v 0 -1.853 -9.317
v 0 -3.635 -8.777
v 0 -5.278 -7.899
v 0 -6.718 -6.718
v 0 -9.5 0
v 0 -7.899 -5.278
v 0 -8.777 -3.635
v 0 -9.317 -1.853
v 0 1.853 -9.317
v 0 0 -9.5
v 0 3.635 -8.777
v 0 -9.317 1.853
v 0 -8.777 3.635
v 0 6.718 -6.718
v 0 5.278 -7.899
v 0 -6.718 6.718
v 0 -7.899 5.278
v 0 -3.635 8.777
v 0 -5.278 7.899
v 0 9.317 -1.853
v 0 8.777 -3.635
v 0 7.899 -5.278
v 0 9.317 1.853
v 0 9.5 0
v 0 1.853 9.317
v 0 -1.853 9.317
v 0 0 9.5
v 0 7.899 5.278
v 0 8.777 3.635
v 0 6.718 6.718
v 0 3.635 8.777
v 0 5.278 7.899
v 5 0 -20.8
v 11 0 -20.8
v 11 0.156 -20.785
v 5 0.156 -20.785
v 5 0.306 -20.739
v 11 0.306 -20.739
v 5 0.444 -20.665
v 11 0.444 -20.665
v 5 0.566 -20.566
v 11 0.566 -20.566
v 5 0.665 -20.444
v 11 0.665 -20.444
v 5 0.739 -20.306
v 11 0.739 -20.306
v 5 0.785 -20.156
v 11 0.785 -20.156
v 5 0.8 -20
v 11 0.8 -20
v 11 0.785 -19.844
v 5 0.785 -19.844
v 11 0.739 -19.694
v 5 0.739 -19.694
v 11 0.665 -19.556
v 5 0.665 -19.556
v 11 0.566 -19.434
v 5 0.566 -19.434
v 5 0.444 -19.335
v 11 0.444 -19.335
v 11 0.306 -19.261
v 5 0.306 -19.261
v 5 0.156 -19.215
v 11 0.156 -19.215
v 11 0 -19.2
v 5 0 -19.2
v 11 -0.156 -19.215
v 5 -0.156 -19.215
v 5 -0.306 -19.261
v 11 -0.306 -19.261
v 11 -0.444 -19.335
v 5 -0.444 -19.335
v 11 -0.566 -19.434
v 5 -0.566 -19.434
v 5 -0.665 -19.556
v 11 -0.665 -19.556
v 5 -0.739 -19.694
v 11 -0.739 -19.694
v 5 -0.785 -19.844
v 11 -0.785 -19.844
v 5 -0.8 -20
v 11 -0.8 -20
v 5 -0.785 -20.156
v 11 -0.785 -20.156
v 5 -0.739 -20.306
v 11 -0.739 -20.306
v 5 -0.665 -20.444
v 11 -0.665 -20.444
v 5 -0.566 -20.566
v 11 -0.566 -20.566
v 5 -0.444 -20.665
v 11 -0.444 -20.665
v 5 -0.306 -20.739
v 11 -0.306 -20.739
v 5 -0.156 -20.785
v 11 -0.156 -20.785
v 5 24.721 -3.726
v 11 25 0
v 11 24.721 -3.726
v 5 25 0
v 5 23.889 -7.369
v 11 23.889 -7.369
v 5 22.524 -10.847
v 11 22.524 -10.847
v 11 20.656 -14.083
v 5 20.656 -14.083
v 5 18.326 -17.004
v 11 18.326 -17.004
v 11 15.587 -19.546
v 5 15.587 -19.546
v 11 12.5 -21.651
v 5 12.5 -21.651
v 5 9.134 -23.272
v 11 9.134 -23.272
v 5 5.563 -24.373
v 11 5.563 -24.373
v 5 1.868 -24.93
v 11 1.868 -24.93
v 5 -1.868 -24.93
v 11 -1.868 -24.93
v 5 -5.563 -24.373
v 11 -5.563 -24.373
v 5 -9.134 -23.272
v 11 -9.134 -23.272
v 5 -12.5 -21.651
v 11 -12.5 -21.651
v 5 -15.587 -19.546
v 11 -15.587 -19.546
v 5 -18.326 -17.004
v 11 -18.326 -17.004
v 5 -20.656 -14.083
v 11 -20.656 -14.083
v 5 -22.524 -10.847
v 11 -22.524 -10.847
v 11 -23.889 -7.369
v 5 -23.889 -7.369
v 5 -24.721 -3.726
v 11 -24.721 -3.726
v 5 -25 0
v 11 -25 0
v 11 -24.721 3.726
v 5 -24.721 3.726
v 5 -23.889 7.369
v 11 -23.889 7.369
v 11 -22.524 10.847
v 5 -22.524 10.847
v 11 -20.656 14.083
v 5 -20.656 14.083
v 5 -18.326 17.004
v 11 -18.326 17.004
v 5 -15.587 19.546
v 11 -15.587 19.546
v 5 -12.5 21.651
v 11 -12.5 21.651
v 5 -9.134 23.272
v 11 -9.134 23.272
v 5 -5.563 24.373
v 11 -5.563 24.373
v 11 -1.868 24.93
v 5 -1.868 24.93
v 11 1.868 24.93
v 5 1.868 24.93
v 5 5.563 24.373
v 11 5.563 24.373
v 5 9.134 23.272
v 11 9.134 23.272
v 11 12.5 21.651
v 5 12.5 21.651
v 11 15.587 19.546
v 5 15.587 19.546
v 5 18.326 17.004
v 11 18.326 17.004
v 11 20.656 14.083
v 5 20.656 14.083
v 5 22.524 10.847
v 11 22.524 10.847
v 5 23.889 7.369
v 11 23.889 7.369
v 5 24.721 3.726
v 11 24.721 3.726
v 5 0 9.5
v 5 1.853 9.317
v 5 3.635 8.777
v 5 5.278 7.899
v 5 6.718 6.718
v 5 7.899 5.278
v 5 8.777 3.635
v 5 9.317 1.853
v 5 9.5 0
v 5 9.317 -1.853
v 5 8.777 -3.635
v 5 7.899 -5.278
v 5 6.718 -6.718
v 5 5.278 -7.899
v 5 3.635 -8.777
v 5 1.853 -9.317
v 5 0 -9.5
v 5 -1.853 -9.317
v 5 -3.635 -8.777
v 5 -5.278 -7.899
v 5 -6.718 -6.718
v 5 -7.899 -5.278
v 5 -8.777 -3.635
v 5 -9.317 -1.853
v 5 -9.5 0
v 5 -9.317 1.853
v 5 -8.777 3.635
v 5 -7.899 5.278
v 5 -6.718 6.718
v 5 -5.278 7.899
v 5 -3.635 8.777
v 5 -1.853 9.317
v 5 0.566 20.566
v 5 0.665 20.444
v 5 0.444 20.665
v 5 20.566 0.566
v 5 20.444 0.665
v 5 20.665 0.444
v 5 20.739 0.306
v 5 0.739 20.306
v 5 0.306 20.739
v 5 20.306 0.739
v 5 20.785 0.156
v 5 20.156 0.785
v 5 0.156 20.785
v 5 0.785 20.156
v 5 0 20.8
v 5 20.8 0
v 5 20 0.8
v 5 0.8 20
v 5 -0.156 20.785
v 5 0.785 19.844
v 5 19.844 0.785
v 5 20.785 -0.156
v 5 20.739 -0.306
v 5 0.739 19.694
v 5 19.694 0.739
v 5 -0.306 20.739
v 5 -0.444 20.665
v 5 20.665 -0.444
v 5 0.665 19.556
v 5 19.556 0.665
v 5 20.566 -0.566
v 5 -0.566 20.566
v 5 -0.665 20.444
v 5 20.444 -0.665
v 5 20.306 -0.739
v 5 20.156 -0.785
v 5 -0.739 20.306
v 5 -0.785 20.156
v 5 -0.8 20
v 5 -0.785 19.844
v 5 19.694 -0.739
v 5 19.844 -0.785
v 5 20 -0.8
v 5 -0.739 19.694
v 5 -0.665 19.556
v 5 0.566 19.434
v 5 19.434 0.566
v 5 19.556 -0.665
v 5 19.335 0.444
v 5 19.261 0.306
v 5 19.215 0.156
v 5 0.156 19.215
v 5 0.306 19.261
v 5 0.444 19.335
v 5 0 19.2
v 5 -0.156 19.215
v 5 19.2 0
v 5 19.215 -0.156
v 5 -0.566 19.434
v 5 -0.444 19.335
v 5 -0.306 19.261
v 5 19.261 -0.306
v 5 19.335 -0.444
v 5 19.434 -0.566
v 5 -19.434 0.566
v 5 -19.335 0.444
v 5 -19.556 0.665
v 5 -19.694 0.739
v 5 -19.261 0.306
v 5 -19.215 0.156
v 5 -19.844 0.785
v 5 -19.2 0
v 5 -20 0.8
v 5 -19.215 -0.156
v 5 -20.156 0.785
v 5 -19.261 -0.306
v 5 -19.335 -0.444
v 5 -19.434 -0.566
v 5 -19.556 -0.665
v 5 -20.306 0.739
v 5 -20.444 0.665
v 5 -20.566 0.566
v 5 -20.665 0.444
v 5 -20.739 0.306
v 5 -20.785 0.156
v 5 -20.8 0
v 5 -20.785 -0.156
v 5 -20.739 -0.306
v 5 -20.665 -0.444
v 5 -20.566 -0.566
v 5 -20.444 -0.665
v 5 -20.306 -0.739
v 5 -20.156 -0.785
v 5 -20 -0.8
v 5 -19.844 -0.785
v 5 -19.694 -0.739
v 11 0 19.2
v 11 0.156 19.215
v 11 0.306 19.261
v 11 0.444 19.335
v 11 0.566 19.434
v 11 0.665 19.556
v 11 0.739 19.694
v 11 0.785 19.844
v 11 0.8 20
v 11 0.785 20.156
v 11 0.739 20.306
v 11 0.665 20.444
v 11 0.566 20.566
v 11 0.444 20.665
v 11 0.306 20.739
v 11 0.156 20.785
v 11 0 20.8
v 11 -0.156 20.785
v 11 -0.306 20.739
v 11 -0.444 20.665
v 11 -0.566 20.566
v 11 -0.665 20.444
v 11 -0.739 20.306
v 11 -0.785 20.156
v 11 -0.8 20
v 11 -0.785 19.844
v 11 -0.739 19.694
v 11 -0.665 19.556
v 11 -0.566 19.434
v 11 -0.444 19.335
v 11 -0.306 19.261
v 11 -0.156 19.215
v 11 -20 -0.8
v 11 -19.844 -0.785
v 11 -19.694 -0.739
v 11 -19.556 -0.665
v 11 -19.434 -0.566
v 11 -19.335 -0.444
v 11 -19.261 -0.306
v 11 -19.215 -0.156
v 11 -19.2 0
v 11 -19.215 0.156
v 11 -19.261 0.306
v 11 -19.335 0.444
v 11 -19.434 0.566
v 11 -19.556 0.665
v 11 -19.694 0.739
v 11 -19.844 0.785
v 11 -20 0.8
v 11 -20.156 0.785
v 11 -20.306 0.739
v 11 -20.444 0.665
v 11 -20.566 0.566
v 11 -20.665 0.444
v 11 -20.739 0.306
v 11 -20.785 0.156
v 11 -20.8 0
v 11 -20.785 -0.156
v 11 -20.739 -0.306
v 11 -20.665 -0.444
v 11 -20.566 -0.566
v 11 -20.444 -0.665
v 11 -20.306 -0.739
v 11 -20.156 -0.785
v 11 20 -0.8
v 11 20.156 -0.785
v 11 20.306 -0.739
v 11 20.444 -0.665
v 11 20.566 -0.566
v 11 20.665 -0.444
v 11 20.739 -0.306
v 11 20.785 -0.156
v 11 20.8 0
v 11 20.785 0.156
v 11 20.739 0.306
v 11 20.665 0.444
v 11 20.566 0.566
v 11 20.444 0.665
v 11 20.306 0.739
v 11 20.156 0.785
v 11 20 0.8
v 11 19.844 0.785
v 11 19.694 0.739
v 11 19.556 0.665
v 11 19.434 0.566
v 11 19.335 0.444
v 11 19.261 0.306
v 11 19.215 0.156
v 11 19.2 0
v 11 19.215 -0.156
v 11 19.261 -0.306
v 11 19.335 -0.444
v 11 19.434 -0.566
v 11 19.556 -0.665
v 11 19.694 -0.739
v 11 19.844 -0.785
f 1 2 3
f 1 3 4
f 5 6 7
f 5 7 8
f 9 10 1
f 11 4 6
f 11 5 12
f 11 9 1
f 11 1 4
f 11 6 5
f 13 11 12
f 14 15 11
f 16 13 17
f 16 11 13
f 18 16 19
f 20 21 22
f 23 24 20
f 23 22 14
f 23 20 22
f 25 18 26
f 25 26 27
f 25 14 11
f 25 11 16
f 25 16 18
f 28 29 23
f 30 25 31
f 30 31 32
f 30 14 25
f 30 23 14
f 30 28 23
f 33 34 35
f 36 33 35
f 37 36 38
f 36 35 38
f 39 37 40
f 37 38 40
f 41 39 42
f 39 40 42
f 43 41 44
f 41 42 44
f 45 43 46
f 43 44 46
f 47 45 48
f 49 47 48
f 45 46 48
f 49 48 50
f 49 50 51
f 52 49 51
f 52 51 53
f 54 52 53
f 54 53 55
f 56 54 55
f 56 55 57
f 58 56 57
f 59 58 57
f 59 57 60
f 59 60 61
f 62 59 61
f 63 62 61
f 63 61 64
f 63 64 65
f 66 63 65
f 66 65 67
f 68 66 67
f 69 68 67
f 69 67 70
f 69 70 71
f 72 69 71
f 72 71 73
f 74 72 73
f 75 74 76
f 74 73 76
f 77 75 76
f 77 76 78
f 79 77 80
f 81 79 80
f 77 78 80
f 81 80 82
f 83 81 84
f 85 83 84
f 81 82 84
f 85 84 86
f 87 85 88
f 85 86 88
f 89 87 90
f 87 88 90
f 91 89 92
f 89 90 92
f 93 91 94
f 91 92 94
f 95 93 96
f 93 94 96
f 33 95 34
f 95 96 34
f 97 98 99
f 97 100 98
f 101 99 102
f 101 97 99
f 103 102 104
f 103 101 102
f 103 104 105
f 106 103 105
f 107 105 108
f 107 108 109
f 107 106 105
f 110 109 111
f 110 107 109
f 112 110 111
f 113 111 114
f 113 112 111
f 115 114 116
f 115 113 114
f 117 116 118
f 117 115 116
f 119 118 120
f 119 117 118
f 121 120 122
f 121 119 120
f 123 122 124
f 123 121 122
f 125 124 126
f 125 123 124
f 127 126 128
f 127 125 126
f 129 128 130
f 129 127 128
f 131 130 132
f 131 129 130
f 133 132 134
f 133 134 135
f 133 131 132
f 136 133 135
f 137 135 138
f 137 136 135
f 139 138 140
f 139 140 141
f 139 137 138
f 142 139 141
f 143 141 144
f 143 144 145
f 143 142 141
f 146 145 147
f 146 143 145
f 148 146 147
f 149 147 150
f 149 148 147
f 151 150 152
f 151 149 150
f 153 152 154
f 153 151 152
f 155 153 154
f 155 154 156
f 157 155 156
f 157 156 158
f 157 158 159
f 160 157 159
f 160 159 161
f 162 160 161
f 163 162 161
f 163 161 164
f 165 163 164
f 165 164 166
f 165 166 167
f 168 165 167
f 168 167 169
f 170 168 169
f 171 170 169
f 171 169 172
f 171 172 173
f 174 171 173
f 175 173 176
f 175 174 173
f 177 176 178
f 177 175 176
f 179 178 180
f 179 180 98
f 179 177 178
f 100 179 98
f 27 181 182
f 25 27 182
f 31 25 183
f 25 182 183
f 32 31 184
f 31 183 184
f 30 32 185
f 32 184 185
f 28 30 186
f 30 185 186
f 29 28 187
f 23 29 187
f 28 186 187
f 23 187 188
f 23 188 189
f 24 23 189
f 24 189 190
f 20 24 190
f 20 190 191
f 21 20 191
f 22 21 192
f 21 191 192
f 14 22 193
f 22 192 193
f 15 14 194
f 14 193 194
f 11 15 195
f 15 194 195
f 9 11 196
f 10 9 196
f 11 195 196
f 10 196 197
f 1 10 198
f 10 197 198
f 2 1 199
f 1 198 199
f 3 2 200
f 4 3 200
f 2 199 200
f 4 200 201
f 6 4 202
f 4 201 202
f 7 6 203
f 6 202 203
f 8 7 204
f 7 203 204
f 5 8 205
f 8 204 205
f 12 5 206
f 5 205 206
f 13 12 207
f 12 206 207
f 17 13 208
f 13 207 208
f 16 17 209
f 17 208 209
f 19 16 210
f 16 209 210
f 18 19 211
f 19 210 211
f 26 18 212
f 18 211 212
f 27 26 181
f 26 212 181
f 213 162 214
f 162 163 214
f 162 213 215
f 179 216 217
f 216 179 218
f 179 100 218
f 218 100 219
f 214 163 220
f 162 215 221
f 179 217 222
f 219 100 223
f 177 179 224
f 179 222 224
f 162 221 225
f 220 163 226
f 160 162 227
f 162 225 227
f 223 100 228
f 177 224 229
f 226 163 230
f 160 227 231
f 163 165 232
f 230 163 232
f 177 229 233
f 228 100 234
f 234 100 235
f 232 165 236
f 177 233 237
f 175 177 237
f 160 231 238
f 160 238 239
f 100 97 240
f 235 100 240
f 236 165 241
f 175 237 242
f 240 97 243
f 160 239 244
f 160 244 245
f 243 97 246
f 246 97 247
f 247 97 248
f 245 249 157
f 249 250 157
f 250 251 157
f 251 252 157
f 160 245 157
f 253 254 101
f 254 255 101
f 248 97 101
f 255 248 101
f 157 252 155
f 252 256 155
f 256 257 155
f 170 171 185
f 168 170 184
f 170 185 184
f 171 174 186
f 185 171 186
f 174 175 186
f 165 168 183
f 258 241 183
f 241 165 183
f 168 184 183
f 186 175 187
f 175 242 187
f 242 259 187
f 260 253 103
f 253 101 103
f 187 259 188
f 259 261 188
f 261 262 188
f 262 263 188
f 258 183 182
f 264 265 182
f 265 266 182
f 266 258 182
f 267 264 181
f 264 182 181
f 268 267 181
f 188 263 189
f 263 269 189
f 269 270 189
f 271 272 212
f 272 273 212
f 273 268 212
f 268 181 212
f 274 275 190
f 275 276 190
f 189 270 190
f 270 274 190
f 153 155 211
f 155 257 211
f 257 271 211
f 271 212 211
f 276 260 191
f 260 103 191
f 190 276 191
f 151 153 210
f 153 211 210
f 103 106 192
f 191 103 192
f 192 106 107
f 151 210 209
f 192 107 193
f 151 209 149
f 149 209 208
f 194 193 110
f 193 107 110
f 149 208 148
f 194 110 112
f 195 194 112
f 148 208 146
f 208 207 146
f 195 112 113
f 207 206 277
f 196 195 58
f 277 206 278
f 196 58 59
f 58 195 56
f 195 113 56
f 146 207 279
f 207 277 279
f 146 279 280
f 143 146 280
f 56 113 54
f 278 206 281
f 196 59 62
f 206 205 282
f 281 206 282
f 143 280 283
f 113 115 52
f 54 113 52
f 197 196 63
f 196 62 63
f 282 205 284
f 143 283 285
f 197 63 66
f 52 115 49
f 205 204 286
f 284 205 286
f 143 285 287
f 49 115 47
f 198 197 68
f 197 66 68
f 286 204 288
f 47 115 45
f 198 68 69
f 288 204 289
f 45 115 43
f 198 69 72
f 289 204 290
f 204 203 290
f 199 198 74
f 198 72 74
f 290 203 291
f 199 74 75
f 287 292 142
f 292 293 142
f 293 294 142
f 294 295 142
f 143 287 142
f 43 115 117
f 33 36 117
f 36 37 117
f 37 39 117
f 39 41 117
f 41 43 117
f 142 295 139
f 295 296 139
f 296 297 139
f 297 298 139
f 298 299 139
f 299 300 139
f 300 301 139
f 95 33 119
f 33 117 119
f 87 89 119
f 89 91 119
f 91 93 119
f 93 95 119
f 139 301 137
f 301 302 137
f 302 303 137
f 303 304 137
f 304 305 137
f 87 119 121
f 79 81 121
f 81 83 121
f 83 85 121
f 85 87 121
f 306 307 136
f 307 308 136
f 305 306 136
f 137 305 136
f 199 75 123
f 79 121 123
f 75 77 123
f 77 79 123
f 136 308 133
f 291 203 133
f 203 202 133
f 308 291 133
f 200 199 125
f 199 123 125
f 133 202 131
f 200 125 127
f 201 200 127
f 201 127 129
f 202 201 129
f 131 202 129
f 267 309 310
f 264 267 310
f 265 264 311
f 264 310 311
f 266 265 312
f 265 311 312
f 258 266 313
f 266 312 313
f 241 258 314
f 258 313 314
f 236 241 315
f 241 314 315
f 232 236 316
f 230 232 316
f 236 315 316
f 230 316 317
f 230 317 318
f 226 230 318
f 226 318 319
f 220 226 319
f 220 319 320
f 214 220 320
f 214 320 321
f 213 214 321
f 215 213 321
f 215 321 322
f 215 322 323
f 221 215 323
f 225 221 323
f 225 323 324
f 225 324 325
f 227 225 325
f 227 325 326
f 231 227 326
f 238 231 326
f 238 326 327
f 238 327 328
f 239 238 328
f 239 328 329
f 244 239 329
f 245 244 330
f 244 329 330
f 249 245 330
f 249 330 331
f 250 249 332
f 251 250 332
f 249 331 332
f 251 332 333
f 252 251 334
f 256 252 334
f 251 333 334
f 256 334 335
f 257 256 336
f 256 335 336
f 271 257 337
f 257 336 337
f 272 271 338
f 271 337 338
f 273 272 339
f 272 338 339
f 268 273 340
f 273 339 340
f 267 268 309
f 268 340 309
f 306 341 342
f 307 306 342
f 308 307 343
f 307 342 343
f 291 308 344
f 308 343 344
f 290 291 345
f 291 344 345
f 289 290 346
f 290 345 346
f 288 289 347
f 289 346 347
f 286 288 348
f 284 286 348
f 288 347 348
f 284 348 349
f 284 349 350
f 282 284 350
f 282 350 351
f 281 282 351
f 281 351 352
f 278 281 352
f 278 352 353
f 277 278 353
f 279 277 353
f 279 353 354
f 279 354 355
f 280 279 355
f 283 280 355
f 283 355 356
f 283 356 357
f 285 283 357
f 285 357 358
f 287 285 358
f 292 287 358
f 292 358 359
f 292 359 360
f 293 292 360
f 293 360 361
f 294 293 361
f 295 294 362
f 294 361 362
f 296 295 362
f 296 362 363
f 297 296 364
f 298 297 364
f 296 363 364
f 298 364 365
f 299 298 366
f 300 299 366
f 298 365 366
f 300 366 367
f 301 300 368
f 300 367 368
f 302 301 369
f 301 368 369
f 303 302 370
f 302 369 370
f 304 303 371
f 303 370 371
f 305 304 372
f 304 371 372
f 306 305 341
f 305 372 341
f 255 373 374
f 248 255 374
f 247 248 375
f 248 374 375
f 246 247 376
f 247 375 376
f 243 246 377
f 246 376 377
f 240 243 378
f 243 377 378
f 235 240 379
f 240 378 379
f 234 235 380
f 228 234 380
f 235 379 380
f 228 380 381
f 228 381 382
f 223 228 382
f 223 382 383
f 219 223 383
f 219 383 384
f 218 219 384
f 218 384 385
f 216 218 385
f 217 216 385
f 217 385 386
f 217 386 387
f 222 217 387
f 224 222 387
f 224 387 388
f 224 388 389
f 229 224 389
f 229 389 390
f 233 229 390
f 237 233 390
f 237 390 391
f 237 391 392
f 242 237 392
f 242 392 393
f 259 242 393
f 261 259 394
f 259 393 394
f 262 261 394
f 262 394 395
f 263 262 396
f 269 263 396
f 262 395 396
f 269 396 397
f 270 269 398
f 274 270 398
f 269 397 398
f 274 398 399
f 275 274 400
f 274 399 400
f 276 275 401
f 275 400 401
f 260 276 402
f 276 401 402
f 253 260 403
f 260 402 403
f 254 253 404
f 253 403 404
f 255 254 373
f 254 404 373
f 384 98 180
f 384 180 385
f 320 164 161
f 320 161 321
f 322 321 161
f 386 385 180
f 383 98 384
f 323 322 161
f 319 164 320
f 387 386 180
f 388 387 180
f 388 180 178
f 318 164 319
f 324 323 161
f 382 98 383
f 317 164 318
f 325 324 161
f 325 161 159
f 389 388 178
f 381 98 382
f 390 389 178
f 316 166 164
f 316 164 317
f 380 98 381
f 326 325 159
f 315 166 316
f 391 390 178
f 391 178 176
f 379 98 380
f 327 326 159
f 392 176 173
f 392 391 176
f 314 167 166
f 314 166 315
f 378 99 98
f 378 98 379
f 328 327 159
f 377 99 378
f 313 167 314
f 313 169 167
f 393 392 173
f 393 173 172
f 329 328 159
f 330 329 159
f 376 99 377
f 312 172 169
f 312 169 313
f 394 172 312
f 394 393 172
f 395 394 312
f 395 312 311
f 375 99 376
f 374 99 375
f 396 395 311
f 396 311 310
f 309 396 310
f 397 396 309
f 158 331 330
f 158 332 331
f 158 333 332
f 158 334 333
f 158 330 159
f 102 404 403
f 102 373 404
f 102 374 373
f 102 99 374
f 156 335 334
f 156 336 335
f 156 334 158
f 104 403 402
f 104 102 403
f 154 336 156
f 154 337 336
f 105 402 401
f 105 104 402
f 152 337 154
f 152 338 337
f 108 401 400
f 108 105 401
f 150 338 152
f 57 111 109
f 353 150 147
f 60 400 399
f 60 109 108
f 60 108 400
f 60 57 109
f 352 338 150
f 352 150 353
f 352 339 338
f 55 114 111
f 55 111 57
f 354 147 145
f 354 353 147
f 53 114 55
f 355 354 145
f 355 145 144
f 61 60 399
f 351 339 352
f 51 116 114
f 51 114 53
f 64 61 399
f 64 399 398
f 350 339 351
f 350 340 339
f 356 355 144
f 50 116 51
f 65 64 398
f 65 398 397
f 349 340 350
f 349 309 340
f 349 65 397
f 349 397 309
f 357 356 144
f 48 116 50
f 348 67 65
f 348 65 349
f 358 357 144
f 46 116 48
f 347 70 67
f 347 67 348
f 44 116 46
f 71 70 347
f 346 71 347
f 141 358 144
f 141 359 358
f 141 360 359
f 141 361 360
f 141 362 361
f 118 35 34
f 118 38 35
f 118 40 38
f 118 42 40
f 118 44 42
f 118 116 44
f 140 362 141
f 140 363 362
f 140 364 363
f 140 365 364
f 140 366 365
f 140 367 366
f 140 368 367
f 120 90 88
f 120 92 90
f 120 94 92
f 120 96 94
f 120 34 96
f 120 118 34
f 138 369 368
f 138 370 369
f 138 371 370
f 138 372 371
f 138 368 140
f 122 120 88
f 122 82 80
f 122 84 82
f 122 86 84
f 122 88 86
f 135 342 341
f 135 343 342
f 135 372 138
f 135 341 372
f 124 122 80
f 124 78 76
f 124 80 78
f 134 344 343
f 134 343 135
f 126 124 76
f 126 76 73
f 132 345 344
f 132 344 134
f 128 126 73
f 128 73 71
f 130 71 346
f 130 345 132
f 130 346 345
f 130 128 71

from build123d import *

# Parameters (mm, degrees)
SKETCH_1_W                  = 6
SKETCH_1_H                  = 25
SKETCH_2_R                  = 9.5
EXTRUDE_1_DEPTH             = 5
HOLE_WIZARD_1_6_1_6_1_D     = 1.6
HOLE_WIZARD_1_6_1_6_1_DEPTH = 6


with BuildPart() as part:
    # 스케치1 → 회전1 (revolve)
    with BuildSketch(Plane(origin=(0, 0, 0), x_dir=(-1, 0, 0), z_dir=(0, 0, -1))):
        with Locations((-8, 12.5)):
            Rectangle(SKETCH_1_W, SKETCH_1_H)
    revolve(axis=Axis((11, 0, 0), (-1, 0, 0)))

    # 스케치2 → 보스-돌출1 (add)
    with BuildSketch(Plane.ZY.offset(-5)):
        Circle(SKETCH_2_R)
    extrude(amount=EXTRUDE_1_DEPTH)

    # Ø1.6 (1.6) 지름 구멍1
    with Locations(Plane.ZY.offset(-5)):
        with Locations((0, 20), (-20, 0), (0, -20), (20, 0)):
            Hole(HOLE_WIZARD_1_6_1_6_1_D / 2, depth=HOLE_WIZARD_1_6_1_6_1_DEPTH)


solid = part.part
